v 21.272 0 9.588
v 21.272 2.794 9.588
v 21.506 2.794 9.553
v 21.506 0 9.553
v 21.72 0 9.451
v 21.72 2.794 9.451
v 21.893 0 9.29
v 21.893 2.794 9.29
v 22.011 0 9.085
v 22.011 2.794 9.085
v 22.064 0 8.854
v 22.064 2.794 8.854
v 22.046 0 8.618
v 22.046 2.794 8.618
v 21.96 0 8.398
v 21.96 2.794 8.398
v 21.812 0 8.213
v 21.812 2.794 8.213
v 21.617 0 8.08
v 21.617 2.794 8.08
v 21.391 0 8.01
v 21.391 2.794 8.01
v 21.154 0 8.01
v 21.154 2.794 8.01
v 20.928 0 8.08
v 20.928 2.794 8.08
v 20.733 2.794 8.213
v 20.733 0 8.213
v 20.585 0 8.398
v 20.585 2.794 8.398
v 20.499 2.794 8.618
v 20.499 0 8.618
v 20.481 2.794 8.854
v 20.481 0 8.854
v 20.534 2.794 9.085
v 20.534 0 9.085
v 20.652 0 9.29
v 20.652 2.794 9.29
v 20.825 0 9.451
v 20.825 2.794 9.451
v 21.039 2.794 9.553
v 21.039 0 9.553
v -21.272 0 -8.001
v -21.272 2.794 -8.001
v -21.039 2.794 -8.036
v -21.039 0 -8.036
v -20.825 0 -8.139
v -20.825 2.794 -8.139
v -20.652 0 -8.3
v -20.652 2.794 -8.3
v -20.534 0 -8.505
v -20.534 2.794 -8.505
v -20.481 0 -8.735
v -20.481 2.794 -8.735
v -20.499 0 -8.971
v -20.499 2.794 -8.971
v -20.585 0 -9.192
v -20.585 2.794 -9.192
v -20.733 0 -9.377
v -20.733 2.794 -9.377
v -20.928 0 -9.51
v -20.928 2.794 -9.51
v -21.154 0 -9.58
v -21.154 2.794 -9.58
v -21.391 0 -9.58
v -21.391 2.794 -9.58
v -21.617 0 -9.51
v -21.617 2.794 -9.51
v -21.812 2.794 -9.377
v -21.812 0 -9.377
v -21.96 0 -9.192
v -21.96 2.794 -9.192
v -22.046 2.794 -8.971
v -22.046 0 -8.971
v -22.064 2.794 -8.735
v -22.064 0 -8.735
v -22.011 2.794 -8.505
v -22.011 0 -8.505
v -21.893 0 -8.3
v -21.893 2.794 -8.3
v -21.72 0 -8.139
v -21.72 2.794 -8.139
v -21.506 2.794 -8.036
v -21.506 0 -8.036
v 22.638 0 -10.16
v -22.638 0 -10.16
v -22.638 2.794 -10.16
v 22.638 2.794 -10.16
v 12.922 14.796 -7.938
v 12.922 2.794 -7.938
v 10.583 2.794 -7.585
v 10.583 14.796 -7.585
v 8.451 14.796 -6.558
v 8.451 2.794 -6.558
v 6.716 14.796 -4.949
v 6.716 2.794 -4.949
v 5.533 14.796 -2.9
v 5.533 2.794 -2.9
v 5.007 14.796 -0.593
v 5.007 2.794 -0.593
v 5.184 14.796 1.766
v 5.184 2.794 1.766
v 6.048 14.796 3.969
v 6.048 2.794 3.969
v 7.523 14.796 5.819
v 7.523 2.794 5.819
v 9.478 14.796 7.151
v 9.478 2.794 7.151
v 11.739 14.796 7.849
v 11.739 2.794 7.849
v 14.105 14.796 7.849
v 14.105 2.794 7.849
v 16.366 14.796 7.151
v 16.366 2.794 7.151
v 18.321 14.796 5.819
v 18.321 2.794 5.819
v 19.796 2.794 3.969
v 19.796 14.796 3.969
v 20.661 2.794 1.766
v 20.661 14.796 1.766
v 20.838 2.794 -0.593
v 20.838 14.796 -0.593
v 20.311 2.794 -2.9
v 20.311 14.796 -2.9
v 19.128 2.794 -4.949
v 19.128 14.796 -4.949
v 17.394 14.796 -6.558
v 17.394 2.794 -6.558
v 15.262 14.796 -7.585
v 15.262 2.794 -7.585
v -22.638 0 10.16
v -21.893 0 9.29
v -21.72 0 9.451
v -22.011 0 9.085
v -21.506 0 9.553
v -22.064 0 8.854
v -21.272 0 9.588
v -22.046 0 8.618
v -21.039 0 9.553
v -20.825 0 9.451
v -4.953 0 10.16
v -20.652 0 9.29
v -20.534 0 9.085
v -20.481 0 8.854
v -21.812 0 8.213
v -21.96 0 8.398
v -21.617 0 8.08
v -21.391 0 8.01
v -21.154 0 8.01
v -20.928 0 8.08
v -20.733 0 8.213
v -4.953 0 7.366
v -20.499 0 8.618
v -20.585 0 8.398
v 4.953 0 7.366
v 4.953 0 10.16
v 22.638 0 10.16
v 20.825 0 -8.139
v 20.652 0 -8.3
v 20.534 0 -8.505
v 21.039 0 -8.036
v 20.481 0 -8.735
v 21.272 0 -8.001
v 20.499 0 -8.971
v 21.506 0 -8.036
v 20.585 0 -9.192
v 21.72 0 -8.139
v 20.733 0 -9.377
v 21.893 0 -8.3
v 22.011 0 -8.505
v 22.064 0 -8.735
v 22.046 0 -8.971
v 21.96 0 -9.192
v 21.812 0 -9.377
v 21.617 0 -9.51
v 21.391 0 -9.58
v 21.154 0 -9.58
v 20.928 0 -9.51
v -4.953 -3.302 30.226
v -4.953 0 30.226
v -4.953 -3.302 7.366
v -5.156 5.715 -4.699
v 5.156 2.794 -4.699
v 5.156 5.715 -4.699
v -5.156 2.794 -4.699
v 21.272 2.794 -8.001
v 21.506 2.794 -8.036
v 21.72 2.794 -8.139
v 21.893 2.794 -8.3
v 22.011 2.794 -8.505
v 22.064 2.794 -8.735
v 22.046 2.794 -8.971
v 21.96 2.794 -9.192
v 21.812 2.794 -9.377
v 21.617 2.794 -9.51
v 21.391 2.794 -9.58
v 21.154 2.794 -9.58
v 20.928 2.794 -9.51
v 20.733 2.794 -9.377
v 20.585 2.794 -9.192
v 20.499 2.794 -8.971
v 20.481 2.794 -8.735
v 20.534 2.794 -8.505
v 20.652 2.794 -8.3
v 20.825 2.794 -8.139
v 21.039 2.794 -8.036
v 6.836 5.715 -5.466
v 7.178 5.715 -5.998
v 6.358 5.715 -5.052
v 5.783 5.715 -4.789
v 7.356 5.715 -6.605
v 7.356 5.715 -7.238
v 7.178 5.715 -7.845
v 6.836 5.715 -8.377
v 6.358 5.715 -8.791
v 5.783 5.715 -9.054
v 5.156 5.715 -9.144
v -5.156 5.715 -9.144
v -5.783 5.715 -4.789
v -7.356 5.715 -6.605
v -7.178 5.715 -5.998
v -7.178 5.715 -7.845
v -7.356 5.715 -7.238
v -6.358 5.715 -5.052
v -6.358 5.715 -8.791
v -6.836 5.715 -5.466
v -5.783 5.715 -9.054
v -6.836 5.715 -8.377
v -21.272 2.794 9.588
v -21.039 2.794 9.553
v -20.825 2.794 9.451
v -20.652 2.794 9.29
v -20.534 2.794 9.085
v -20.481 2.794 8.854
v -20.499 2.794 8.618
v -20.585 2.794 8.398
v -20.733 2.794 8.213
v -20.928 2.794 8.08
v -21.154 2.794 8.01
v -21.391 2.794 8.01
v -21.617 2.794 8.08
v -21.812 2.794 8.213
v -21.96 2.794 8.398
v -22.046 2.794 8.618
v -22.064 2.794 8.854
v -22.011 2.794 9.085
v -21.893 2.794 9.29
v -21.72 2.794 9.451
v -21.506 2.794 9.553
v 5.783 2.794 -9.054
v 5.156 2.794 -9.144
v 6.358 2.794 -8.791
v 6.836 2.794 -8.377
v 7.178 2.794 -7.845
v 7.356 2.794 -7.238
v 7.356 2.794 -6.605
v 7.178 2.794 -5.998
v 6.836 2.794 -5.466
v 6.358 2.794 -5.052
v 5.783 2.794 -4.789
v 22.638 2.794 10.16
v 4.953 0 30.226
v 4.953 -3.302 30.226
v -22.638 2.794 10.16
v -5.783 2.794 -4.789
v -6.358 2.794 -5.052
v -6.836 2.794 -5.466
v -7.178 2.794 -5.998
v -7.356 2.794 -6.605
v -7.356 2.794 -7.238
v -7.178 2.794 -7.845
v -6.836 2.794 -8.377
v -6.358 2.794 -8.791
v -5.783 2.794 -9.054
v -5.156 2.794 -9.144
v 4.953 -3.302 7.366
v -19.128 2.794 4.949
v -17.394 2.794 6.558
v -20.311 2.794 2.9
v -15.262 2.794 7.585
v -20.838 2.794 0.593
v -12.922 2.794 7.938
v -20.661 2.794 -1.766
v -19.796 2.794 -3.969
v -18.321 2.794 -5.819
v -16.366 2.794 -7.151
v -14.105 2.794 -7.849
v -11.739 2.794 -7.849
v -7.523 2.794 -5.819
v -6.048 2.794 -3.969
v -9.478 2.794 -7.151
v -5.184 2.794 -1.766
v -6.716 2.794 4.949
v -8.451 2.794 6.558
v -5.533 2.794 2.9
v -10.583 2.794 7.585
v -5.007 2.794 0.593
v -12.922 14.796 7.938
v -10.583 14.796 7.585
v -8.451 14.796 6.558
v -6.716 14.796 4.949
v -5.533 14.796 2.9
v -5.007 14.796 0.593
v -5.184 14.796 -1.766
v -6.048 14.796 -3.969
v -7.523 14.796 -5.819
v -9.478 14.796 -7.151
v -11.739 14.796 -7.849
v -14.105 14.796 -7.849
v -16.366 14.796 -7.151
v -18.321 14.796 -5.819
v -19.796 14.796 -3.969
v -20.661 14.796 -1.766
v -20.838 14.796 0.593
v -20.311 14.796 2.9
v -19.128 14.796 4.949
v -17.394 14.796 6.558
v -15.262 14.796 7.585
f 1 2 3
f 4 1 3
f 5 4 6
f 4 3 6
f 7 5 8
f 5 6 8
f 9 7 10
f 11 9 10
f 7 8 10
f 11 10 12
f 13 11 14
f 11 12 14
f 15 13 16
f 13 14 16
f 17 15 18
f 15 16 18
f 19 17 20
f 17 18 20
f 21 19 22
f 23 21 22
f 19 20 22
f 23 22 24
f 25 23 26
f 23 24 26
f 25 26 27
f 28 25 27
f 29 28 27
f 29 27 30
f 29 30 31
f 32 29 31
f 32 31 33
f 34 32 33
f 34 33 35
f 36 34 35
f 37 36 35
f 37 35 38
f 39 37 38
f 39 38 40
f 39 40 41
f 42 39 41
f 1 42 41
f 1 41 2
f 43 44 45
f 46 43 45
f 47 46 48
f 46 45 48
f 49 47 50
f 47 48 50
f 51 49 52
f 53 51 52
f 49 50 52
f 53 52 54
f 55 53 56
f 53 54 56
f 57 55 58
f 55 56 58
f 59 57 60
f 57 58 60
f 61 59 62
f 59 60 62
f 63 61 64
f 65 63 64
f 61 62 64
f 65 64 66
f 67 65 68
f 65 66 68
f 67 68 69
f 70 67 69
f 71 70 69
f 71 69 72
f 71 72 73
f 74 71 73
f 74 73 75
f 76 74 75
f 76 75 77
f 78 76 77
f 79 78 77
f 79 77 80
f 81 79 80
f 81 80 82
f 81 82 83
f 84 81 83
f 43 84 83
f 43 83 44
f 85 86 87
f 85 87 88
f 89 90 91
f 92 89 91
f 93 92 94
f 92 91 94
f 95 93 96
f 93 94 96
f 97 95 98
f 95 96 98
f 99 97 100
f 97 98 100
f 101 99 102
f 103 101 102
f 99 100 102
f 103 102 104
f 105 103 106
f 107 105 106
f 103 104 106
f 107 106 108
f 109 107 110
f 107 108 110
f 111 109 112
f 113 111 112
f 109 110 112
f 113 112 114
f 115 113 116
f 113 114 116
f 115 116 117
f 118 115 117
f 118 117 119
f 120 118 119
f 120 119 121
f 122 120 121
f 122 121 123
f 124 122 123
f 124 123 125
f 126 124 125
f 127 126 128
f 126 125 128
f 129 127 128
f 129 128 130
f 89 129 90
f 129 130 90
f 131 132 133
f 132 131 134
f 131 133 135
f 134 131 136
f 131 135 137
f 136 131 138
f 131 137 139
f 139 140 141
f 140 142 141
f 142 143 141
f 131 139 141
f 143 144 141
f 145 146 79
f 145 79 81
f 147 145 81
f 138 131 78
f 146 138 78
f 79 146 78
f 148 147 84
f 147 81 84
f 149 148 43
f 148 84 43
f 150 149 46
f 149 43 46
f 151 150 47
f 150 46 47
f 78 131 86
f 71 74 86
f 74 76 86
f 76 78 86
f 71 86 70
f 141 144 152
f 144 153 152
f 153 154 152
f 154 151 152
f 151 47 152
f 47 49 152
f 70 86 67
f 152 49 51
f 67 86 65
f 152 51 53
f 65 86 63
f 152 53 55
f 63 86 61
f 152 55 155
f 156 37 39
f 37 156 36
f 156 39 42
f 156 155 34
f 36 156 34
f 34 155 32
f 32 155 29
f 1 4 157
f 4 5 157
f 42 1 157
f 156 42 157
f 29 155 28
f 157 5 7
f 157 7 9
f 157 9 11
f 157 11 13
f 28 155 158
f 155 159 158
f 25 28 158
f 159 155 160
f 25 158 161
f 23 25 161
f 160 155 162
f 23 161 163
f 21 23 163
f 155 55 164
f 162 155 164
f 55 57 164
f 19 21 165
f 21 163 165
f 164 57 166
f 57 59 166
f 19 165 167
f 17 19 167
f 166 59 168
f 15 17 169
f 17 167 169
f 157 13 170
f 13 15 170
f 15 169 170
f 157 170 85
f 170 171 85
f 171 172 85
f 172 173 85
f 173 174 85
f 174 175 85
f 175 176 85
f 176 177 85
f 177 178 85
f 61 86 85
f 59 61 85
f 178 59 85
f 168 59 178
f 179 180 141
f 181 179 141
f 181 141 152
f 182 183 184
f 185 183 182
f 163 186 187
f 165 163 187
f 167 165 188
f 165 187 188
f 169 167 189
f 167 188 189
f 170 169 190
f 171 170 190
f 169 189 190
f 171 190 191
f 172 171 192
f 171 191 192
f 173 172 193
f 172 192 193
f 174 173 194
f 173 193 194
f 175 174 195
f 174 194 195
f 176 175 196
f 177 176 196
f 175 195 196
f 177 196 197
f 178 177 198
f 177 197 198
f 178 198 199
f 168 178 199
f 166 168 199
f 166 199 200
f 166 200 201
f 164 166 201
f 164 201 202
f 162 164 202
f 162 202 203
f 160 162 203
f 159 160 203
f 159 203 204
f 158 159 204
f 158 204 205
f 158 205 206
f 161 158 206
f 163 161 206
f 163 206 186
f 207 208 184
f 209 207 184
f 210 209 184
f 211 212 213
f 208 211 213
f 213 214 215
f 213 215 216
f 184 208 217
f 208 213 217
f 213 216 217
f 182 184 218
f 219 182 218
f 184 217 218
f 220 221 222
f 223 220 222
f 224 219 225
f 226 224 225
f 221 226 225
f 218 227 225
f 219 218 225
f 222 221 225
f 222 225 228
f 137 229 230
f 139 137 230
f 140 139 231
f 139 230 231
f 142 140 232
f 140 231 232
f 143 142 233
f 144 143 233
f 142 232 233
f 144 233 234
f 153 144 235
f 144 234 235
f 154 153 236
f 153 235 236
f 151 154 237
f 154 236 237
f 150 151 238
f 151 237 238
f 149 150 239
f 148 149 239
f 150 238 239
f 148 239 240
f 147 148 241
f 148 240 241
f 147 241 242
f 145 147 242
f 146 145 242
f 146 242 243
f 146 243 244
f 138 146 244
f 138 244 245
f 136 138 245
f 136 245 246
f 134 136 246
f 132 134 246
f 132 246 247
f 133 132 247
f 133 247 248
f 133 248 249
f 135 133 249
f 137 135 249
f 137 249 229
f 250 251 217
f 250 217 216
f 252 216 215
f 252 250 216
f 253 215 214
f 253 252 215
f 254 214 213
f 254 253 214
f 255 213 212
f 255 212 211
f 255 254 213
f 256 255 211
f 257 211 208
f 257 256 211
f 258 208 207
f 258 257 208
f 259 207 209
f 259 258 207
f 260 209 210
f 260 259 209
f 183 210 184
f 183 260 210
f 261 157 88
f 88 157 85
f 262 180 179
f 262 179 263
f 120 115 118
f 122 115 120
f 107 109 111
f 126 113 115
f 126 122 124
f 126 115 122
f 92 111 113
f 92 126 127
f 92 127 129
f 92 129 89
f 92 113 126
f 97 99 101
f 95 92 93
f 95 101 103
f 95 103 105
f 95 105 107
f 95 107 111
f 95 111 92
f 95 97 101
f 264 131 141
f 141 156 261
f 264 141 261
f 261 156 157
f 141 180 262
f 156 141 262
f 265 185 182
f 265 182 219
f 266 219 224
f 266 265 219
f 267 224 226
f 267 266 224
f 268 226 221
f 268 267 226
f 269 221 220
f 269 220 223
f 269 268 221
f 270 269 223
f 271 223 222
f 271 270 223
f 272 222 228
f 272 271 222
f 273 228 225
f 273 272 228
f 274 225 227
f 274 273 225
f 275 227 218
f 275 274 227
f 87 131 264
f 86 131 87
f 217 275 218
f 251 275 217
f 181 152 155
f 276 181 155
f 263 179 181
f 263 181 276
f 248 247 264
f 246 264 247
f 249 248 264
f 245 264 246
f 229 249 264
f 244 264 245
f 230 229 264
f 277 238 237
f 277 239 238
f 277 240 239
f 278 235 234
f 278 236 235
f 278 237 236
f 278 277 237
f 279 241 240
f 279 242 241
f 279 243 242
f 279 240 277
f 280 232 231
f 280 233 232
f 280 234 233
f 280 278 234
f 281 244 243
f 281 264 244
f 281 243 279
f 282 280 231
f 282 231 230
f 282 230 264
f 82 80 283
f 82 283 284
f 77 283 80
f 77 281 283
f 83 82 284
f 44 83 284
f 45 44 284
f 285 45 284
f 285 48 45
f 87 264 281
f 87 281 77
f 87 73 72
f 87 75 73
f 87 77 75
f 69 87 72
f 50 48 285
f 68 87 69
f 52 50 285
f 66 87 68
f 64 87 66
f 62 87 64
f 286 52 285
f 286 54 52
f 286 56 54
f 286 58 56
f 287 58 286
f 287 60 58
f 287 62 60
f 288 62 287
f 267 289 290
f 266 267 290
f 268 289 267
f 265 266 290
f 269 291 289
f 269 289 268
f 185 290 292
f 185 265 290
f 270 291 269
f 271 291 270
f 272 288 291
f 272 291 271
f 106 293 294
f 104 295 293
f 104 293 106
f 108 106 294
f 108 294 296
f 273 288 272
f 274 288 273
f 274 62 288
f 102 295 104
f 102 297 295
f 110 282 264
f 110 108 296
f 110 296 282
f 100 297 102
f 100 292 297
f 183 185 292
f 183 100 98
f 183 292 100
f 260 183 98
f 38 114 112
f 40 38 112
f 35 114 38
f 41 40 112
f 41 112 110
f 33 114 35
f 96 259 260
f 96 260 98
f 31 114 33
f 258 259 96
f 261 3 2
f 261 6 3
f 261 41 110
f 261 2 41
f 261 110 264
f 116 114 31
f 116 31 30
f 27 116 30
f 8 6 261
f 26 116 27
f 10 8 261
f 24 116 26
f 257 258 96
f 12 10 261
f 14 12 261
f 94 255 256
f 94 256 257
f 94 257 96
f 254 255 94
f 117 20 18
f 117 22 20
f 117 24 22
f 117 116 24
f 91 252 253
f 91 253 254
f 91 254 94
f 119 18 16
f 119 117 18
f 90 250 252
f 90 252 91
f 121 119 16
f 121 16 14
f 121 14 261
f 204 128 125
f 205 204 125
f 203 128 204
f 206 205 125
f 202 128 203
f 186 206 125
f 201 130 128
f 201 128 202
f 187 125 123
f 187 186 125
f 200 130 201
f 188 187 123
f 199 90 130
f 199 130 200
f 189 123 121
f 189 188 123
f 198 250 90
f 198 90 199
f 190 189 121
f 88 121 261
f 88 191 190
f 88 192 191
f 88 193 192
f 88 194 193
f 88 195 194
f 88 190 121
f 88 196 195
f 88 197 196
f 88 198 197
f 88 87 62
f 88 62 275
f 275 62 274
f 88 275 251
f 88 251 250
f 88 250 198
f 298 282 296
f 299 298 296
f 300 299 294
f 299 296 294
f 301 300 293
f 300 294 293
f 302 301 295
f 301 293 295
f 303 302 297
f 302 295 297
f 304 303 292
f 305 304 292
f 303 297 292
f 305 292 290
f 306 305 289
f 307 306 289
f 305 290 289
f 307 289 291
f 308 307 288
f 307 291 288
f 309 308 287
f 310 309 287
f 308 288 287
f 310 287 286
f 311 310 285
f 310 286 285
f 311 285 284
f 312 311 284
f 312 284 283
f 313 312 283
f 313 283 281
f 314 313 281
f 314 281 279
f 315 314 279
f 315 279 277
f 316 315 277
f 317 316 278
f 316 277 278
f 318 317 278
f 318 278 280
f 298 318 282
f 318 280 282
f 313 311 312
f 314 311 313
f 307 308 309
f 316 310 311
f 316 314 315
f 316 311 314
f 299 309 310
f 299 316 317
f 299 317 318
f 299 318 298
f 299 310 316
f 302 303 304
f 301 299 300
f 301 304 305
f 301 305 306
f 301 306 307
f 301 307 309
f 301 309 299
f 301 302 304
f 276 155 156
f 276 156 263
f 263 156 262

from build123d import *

# Parameters (mm, degrees)
SKETCH1_W           = 45.2755
SKETCH1_H           = 20.32
BOSS_EXTRUDE1_DEPTH = 2.794
SKETCH2_R           = 7.9375
BOSS_EXTRUDE2_DEPTH = 12.0015
BOSS_EXTRUDE3_DEPTH = 2.921
SKETCH5_W           = 9.906
SKETCH5_H           = 20.066
SKETCH5_H_2         = 2.794
BOSS_EXTRUDE4_DEPTH = 3.302
SKETCH6_R           = 0.79375
CUT_EXTRUDE1_DEPTH  = 40.624674173


with BuildPart() as part:
    # Sketch1 → Boss-Extrude1 (new body)
    with BuildSketch(Plane(origin=(0, 0, 0), x_dir=(1, 0, 0), z_dir=(0, 1, 0))):
        Rectangle(SKETCH1_W, SKETCH1_H)
    extrude(amount=BOSS_EXTRUDE1_DEPTH)

    # Sketch2 → Boss-Extrude2 (add)
    with BuildSketch(Plane(origin=(0, 2.794, 0), x_dir=(1, 0, 0), z_dir=(0, 1, 0))):
        with Locations(Location((-12.92225, 0, 0), (0, 0, 270))):
            Circle(SKETCH2_R)
        with Locations(Location((12.92225, 0, 0), (0, 0, 90))):
            Circle(SKETCH2_R)
    extrude(amount=BOSS_EXTRUDE2_DEPTH)

    # Sketch3 → Boss-Extrude3 (add)
    with BuildSketch(Plane(origin=(0, 2.794, 0), x_dir=(1, 0, 0), z_dir=(0, 1, 0))):
        with BuildLine():
            Line((-5.156416146, 9.144), (5.156416146, 9.144))
            ThreePointArc((5.156416146, 9.144), (7.378916146, 6.9215), (5.156416146, 4.699))
            Line((5.156416146, 4.699), (-5.156416146, 4.699))
            ThreePointArc((-5.156416146, 4.699), (-7.378916146, 6.9215), (-5.156416146, 9.144))
        make_face()
    extrude(amount=BOSS_EXTRUDE3_DEPTH)

    # Sketch5 → Boss-Extrude4 (add)
    with BuildSketch(Plane.XZ):
        with Locations((0, 20.193)):
            Rectangle(SKETCH5_W, SKETCH5_H)
        with Locations((0, 8.763)):
            Rectangle(SKETCH5_W, SKETCH5_H_2)
    extrude(amount=BOSS_EXTRUDE4_DEPTH)

    # Sketch6 → Cut-Extrude1 (cut, through all)
    with BuildSketch(Plane(origin=(0, 2.794, 0), x_dir=(1, 0, 0), z_dir=(0, 1, 0))):
        with Locations(Location((-21.2725, 8.79475, 0), (0, 0, 270))):
            Circle(SKETCH6_R)
        with Locations(Location((-21.2725, -8.79475, 0), (0, 0, 270))):
            Circle(SKETCH6_R)
        with Locations(Location((21.2725, -8.79475, 0), (0, 0, 270))):
            Circle(SKETCH6_R)
        with Locations(Location((21.2725, 8.79475, 0), (0, 0, 270))):
            Circle(SKETCH6_R)
    extrude(amount=-CUT_EXTRUDE1_DEPTH, mode=Mode.SUBTRACT)


solid = part.part
